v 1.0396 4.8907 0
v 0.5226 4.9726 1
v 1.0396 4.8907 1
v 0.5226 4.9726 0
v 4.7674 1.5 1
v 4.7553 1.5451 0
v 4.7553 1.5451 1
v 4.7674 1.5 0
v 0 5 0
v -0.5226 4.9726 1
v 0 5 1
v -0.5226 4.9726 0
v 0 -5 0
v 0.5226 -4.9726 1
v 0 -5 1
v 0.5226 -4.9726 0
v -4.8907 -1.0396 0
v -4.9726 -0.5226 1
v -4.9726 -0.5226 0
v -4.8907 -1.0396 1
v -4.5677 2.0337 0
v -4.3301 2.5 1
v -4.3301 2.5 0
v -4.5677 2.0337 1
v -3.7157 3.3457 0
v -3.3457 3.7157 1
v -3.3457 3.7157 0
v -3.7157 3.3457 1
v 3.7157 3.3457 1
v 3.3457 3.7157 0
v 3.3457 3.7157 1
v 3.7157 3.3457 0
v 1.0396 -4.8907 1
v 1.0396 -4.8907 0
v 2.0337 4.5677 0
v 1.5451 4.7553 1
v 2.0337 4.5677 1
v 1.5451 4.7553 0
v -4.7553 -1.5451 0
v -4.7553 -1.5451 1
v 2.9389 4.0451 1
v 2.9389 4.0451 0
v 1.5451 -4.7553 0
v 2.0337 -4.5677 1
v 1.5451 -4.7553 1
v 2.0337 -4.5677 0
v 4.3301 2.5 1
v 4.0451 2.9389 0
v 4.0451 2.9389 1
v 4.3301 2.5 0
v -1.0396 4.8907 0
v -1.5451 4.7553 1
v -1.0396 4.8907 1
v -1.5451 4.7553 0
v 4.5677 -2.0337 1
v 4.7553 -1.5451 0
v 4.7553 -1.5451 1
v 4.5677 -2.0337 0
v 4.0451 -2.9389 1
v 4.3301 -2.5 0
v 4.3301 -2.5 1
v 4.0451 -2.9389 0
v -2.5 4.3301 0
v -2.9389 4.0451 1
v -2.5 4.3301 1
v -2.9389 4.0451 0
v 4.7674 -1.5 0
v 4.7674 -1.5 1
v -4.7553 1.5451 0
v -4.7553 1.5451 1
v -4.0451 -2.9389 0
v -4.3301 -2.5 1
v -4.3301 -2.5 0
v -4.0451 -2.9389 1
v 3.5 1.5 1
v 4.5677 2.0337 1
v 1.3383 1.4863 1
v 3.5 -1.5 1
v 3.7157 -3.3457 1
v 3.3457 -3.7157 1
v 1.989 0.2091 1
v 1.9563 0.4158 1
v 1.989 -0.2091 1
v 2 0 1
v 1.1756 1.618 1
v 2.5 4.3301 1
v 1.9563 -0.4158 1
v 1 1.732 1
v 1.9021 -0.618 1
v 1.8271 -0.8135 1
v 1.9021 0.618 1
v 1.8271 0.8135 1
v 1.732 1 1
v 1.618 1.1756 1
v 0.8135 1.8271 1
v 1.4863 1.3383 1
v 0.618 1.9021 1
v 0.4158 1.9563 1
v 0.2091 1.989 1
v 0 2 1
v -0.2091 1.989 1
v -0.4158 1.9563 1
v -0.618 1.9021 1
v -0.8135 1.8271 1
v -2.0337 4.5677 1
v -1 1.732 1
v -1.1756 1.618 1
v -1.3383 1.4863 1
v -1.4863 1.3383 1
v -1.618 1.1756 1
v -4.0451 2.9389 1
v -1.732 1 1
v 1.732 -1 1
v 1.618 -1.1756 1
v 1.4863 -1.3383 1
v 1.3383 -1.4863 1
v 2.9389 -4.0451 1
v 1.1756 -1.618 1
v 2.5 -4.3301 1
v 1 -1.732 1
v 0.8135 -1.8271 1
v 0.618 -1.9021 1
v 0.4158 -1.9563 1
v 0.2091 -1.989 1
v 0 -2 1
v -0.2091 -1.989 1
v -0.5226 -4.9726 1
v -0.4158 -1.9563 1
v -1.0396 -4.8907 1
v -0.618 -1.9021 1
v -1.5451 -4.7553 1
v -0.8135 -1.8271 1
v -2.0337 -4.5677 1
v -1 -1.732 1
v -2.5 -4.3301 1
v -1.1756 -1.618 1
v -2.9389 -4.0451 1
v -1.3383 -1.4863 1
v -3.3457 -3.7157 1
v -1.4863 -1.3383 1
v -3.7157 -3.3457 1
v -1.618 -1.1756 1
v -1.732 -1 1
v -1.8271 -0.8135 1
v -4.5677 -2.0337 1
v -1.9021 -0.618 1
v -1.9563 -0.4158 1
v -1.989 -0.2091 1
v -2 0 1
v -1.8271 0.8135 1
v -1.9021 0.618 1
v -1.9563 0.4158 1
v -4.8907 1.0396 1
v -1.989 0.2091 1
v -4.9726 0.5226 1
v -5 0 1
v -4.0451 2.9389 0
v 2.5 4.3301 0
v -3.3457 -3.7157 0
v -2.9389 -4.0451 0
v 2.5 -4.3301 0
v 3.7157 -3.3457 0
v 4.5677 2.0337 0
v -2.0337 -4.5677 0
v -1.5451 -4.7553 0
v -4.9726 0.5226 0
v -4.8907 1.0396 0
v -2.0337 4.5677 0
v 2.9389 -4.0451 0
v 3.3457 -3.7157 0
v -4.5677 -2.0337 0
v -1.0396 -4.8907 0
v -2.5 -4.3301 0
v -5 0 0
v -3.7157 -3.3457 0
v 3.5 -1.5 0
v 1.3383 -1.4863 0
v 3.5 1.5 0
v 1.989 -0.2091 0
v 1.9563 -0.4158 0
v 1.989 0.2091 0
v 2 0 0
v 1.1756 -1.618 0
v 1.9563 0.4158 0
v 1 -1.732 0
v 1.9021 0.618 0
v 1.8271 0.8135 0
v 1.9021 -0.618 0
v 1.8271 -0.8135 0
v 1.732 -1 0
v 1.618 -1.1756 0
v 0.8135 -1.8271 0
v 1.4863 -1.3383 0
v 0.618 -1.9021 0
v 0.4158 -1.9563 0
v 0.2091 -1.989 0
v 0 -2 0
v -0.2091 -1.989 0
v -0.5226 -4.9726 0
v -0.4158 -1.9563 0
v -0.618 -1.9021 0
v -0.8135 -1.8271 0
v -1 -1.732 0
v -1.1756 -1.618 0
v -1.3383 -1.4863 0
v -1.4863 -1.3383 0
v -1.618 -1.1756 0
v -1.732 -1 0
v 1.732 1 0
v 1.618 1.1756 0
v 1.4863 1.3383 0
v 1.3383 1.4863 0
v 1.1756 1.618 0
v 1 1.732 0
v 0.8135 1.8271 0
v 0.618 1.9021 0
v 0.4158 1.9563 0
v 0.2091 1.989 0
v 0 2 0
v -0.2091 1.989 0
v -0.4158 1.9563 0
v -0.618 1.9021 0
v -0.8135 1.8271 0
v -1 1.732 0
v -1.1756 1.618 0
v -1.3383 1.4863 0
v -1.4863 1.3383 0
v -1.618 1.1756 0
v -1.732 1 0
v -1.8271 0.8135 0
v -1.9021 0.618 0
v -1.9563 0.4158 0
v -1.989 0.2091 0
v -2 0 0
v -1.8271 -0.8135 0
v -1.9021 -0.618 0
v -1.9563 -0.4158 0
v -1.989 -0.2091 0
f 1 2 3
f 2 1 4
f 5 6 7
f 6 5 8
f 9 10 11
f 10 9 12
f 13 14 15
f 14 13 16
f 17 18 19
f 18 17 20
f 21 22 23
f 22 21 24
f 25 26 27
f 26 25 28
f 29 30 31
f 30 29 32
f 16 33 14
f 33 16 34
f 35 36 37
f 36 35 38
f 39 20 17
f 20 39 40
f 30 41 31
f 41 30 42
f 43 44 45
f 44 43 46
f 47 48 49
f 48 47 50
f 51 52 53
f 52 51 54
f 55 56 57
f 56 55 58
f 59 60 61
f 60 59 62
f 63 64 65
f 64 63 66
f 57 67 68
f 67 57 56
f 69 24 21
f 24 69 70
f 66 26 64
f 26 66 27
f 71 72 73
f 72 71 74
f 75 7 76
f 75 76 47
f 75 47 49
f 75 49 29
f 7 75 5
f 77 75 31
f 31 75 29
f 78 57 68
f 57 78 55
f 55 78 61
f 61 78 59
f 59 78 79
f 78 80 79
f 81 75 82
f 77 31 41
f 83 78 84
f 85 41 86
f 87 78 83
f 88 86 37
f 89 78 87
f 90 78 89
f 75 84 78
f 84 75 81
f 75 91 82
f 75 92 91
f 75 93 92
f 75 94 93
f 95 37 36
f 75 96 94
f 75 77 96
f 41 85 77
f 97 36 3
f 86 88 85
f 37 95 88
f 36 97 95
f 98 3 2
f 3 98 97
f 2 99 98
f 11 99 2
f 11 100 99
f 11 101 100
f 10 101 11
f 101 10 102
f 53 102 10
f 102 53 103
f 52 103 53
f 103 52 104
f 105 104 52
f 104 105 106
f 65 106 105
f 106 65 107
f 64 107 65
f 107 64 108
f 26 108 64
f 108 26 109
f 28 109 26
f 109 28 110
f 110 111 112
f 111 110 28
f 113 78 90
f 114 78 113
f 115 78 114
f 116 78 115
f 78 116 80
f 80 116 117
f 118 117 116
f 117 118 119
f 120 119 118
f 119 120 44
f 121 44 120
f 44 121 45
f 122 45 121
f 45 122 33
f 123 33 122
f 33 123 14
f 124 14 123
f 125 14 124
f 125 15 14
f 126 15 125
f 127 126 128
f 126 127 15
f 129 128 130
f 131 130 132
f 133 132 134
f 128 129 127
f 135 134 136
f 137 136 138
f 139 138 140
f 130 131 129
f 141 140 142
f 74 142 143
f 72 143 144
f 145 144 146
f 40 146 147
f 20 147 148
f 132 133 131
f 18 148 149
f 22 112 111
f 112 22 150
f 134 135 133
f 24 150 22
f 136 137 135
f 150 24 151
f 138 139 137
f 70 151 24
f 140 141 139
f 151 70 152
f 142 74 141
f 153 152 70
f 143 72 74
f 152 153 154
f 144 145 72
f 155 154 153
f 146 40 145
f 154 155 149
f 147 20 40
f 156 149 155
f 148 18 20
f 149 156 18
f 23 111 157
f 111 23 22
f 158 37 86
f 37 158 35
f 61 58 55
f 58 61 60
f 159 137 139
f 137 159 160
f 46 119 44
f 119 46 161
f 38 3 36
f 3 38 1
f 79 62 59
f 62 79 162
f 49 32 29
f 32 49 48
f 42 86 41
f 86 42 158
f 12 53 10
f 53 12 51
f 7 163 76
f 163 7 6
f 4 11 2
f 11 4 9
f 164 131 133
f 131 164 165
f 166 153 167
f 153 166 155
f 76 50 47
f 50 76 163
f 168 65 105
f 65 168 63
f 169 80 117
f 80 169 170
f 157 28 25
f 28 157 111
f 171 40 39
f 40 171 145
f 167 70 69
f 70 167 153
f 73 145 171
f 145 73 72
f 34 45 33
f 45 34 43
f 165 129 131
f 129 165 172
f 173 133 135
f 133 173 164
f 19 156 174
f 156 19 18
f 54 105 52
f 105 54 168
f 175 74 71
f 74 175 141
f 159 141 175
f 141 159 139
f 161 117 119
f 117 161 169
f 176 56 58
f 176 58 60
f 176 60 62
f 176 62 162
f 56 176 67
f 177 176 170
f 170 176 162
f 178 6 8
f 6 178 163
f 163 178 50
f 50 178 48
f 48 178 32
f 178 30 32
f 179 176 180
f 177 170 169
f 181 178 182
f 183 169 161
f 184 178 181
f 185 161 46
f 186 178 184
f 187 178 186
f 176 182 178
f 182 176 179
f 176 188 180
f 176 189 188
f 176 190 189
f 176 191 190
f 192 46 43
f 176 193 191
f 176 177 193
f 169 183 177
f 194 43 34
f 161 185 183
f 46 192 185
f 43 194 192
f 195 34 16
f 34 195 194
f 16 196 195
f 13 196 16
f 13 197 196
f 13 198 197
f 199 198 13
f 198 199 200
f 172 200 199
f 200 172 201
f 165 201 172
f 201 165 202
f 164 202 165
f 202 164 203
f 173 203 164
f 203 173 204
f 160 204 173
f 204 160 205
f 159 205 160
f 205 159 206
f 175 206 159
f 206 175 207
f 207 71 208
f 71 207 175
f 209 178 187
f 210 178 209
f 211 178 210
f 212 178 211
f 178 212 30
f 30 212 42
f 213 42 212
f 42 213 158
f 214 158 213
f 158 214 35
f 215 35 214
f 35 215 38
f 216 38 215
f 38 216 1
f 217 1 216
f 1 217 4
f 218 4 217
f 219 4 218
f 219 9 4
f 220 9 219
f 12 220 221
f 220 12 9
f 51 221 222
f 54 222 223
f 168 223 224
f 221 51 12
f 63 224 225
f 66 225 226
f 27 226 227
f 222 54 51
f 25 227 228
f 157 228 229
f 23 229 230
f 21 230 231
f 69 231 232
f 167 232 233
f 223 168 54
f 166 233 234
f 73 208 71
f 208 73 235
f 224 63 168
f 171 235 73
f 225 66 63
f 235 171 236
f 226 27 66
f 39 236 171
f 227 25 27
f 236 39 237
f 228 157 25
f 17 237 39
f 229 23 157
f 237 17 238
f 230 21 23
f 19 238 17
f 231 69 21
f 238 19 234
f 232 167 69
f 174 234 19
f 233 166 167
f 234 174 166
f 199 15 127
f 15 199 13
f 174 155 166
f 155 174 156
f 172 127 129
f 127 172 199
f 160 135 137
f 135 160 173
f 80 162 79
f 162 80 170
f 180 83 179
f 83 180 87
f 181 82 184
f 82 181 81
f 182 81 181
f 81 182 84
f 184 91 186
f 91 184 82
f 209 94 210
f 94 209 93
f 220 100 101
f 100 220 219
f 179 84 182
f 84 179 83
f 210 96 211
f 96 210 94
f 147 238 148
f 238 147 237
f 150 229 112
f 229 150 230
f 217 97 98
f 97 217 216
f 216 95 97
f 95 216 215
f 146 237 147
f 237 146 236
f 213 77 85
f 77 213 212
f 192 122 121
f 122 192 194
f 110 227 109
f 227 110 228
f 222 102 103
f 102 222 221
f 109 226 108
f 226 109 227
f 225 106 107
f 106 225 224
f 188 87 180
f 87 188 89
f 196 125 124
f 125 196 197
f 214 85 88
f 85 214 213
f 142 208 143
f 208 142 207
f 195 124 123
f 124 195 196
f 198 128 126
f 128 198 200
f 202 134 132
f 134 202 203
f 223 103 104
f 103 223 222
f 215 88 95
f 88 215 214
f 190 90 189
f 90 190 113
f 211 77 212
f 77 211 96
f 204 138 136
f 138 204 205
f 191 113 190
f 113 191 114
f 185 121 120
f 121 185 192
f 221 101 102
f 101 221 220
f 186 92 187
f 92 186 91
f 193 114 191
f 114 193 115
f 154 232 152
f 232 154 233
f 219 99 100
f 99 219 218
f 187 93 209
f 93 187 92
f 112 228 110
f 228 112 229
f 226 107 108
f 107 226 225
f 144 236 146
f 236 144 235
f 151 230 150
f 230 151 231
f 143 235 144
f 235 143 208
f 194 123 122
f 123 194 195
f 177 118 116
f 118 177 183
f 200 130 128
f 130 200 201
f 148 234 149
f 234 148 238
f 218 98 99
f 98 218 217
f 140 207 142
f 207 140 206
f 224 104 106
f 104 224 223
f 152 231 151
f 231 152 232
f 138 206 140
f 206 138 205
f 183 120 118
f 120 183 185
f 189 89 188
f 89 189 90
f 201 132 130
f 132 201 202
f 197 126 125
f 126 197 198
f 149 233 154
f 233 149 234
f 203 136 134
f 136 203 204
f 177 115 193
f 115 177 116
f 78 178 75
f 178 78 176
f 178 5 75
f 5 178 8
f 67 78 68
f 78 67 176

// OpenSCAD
// External retaining ring with installation gap.
$fn = 60;
eps = 0.02;
shaft_d = 4;
outer_d = 10;
thickness = 1;
gap = 3;
difference() {
    cylinder(d = outer_d, h = thickness);
    translate([0, 0, -eps]) cylinder(d = shaft_d, h = thickness + 2 * eps);
    translate([outer_d / 2 - gap / 2, -gap / 2, -eps]) cube([gap + eps, gap, thickness + 2 * eps]);
}
